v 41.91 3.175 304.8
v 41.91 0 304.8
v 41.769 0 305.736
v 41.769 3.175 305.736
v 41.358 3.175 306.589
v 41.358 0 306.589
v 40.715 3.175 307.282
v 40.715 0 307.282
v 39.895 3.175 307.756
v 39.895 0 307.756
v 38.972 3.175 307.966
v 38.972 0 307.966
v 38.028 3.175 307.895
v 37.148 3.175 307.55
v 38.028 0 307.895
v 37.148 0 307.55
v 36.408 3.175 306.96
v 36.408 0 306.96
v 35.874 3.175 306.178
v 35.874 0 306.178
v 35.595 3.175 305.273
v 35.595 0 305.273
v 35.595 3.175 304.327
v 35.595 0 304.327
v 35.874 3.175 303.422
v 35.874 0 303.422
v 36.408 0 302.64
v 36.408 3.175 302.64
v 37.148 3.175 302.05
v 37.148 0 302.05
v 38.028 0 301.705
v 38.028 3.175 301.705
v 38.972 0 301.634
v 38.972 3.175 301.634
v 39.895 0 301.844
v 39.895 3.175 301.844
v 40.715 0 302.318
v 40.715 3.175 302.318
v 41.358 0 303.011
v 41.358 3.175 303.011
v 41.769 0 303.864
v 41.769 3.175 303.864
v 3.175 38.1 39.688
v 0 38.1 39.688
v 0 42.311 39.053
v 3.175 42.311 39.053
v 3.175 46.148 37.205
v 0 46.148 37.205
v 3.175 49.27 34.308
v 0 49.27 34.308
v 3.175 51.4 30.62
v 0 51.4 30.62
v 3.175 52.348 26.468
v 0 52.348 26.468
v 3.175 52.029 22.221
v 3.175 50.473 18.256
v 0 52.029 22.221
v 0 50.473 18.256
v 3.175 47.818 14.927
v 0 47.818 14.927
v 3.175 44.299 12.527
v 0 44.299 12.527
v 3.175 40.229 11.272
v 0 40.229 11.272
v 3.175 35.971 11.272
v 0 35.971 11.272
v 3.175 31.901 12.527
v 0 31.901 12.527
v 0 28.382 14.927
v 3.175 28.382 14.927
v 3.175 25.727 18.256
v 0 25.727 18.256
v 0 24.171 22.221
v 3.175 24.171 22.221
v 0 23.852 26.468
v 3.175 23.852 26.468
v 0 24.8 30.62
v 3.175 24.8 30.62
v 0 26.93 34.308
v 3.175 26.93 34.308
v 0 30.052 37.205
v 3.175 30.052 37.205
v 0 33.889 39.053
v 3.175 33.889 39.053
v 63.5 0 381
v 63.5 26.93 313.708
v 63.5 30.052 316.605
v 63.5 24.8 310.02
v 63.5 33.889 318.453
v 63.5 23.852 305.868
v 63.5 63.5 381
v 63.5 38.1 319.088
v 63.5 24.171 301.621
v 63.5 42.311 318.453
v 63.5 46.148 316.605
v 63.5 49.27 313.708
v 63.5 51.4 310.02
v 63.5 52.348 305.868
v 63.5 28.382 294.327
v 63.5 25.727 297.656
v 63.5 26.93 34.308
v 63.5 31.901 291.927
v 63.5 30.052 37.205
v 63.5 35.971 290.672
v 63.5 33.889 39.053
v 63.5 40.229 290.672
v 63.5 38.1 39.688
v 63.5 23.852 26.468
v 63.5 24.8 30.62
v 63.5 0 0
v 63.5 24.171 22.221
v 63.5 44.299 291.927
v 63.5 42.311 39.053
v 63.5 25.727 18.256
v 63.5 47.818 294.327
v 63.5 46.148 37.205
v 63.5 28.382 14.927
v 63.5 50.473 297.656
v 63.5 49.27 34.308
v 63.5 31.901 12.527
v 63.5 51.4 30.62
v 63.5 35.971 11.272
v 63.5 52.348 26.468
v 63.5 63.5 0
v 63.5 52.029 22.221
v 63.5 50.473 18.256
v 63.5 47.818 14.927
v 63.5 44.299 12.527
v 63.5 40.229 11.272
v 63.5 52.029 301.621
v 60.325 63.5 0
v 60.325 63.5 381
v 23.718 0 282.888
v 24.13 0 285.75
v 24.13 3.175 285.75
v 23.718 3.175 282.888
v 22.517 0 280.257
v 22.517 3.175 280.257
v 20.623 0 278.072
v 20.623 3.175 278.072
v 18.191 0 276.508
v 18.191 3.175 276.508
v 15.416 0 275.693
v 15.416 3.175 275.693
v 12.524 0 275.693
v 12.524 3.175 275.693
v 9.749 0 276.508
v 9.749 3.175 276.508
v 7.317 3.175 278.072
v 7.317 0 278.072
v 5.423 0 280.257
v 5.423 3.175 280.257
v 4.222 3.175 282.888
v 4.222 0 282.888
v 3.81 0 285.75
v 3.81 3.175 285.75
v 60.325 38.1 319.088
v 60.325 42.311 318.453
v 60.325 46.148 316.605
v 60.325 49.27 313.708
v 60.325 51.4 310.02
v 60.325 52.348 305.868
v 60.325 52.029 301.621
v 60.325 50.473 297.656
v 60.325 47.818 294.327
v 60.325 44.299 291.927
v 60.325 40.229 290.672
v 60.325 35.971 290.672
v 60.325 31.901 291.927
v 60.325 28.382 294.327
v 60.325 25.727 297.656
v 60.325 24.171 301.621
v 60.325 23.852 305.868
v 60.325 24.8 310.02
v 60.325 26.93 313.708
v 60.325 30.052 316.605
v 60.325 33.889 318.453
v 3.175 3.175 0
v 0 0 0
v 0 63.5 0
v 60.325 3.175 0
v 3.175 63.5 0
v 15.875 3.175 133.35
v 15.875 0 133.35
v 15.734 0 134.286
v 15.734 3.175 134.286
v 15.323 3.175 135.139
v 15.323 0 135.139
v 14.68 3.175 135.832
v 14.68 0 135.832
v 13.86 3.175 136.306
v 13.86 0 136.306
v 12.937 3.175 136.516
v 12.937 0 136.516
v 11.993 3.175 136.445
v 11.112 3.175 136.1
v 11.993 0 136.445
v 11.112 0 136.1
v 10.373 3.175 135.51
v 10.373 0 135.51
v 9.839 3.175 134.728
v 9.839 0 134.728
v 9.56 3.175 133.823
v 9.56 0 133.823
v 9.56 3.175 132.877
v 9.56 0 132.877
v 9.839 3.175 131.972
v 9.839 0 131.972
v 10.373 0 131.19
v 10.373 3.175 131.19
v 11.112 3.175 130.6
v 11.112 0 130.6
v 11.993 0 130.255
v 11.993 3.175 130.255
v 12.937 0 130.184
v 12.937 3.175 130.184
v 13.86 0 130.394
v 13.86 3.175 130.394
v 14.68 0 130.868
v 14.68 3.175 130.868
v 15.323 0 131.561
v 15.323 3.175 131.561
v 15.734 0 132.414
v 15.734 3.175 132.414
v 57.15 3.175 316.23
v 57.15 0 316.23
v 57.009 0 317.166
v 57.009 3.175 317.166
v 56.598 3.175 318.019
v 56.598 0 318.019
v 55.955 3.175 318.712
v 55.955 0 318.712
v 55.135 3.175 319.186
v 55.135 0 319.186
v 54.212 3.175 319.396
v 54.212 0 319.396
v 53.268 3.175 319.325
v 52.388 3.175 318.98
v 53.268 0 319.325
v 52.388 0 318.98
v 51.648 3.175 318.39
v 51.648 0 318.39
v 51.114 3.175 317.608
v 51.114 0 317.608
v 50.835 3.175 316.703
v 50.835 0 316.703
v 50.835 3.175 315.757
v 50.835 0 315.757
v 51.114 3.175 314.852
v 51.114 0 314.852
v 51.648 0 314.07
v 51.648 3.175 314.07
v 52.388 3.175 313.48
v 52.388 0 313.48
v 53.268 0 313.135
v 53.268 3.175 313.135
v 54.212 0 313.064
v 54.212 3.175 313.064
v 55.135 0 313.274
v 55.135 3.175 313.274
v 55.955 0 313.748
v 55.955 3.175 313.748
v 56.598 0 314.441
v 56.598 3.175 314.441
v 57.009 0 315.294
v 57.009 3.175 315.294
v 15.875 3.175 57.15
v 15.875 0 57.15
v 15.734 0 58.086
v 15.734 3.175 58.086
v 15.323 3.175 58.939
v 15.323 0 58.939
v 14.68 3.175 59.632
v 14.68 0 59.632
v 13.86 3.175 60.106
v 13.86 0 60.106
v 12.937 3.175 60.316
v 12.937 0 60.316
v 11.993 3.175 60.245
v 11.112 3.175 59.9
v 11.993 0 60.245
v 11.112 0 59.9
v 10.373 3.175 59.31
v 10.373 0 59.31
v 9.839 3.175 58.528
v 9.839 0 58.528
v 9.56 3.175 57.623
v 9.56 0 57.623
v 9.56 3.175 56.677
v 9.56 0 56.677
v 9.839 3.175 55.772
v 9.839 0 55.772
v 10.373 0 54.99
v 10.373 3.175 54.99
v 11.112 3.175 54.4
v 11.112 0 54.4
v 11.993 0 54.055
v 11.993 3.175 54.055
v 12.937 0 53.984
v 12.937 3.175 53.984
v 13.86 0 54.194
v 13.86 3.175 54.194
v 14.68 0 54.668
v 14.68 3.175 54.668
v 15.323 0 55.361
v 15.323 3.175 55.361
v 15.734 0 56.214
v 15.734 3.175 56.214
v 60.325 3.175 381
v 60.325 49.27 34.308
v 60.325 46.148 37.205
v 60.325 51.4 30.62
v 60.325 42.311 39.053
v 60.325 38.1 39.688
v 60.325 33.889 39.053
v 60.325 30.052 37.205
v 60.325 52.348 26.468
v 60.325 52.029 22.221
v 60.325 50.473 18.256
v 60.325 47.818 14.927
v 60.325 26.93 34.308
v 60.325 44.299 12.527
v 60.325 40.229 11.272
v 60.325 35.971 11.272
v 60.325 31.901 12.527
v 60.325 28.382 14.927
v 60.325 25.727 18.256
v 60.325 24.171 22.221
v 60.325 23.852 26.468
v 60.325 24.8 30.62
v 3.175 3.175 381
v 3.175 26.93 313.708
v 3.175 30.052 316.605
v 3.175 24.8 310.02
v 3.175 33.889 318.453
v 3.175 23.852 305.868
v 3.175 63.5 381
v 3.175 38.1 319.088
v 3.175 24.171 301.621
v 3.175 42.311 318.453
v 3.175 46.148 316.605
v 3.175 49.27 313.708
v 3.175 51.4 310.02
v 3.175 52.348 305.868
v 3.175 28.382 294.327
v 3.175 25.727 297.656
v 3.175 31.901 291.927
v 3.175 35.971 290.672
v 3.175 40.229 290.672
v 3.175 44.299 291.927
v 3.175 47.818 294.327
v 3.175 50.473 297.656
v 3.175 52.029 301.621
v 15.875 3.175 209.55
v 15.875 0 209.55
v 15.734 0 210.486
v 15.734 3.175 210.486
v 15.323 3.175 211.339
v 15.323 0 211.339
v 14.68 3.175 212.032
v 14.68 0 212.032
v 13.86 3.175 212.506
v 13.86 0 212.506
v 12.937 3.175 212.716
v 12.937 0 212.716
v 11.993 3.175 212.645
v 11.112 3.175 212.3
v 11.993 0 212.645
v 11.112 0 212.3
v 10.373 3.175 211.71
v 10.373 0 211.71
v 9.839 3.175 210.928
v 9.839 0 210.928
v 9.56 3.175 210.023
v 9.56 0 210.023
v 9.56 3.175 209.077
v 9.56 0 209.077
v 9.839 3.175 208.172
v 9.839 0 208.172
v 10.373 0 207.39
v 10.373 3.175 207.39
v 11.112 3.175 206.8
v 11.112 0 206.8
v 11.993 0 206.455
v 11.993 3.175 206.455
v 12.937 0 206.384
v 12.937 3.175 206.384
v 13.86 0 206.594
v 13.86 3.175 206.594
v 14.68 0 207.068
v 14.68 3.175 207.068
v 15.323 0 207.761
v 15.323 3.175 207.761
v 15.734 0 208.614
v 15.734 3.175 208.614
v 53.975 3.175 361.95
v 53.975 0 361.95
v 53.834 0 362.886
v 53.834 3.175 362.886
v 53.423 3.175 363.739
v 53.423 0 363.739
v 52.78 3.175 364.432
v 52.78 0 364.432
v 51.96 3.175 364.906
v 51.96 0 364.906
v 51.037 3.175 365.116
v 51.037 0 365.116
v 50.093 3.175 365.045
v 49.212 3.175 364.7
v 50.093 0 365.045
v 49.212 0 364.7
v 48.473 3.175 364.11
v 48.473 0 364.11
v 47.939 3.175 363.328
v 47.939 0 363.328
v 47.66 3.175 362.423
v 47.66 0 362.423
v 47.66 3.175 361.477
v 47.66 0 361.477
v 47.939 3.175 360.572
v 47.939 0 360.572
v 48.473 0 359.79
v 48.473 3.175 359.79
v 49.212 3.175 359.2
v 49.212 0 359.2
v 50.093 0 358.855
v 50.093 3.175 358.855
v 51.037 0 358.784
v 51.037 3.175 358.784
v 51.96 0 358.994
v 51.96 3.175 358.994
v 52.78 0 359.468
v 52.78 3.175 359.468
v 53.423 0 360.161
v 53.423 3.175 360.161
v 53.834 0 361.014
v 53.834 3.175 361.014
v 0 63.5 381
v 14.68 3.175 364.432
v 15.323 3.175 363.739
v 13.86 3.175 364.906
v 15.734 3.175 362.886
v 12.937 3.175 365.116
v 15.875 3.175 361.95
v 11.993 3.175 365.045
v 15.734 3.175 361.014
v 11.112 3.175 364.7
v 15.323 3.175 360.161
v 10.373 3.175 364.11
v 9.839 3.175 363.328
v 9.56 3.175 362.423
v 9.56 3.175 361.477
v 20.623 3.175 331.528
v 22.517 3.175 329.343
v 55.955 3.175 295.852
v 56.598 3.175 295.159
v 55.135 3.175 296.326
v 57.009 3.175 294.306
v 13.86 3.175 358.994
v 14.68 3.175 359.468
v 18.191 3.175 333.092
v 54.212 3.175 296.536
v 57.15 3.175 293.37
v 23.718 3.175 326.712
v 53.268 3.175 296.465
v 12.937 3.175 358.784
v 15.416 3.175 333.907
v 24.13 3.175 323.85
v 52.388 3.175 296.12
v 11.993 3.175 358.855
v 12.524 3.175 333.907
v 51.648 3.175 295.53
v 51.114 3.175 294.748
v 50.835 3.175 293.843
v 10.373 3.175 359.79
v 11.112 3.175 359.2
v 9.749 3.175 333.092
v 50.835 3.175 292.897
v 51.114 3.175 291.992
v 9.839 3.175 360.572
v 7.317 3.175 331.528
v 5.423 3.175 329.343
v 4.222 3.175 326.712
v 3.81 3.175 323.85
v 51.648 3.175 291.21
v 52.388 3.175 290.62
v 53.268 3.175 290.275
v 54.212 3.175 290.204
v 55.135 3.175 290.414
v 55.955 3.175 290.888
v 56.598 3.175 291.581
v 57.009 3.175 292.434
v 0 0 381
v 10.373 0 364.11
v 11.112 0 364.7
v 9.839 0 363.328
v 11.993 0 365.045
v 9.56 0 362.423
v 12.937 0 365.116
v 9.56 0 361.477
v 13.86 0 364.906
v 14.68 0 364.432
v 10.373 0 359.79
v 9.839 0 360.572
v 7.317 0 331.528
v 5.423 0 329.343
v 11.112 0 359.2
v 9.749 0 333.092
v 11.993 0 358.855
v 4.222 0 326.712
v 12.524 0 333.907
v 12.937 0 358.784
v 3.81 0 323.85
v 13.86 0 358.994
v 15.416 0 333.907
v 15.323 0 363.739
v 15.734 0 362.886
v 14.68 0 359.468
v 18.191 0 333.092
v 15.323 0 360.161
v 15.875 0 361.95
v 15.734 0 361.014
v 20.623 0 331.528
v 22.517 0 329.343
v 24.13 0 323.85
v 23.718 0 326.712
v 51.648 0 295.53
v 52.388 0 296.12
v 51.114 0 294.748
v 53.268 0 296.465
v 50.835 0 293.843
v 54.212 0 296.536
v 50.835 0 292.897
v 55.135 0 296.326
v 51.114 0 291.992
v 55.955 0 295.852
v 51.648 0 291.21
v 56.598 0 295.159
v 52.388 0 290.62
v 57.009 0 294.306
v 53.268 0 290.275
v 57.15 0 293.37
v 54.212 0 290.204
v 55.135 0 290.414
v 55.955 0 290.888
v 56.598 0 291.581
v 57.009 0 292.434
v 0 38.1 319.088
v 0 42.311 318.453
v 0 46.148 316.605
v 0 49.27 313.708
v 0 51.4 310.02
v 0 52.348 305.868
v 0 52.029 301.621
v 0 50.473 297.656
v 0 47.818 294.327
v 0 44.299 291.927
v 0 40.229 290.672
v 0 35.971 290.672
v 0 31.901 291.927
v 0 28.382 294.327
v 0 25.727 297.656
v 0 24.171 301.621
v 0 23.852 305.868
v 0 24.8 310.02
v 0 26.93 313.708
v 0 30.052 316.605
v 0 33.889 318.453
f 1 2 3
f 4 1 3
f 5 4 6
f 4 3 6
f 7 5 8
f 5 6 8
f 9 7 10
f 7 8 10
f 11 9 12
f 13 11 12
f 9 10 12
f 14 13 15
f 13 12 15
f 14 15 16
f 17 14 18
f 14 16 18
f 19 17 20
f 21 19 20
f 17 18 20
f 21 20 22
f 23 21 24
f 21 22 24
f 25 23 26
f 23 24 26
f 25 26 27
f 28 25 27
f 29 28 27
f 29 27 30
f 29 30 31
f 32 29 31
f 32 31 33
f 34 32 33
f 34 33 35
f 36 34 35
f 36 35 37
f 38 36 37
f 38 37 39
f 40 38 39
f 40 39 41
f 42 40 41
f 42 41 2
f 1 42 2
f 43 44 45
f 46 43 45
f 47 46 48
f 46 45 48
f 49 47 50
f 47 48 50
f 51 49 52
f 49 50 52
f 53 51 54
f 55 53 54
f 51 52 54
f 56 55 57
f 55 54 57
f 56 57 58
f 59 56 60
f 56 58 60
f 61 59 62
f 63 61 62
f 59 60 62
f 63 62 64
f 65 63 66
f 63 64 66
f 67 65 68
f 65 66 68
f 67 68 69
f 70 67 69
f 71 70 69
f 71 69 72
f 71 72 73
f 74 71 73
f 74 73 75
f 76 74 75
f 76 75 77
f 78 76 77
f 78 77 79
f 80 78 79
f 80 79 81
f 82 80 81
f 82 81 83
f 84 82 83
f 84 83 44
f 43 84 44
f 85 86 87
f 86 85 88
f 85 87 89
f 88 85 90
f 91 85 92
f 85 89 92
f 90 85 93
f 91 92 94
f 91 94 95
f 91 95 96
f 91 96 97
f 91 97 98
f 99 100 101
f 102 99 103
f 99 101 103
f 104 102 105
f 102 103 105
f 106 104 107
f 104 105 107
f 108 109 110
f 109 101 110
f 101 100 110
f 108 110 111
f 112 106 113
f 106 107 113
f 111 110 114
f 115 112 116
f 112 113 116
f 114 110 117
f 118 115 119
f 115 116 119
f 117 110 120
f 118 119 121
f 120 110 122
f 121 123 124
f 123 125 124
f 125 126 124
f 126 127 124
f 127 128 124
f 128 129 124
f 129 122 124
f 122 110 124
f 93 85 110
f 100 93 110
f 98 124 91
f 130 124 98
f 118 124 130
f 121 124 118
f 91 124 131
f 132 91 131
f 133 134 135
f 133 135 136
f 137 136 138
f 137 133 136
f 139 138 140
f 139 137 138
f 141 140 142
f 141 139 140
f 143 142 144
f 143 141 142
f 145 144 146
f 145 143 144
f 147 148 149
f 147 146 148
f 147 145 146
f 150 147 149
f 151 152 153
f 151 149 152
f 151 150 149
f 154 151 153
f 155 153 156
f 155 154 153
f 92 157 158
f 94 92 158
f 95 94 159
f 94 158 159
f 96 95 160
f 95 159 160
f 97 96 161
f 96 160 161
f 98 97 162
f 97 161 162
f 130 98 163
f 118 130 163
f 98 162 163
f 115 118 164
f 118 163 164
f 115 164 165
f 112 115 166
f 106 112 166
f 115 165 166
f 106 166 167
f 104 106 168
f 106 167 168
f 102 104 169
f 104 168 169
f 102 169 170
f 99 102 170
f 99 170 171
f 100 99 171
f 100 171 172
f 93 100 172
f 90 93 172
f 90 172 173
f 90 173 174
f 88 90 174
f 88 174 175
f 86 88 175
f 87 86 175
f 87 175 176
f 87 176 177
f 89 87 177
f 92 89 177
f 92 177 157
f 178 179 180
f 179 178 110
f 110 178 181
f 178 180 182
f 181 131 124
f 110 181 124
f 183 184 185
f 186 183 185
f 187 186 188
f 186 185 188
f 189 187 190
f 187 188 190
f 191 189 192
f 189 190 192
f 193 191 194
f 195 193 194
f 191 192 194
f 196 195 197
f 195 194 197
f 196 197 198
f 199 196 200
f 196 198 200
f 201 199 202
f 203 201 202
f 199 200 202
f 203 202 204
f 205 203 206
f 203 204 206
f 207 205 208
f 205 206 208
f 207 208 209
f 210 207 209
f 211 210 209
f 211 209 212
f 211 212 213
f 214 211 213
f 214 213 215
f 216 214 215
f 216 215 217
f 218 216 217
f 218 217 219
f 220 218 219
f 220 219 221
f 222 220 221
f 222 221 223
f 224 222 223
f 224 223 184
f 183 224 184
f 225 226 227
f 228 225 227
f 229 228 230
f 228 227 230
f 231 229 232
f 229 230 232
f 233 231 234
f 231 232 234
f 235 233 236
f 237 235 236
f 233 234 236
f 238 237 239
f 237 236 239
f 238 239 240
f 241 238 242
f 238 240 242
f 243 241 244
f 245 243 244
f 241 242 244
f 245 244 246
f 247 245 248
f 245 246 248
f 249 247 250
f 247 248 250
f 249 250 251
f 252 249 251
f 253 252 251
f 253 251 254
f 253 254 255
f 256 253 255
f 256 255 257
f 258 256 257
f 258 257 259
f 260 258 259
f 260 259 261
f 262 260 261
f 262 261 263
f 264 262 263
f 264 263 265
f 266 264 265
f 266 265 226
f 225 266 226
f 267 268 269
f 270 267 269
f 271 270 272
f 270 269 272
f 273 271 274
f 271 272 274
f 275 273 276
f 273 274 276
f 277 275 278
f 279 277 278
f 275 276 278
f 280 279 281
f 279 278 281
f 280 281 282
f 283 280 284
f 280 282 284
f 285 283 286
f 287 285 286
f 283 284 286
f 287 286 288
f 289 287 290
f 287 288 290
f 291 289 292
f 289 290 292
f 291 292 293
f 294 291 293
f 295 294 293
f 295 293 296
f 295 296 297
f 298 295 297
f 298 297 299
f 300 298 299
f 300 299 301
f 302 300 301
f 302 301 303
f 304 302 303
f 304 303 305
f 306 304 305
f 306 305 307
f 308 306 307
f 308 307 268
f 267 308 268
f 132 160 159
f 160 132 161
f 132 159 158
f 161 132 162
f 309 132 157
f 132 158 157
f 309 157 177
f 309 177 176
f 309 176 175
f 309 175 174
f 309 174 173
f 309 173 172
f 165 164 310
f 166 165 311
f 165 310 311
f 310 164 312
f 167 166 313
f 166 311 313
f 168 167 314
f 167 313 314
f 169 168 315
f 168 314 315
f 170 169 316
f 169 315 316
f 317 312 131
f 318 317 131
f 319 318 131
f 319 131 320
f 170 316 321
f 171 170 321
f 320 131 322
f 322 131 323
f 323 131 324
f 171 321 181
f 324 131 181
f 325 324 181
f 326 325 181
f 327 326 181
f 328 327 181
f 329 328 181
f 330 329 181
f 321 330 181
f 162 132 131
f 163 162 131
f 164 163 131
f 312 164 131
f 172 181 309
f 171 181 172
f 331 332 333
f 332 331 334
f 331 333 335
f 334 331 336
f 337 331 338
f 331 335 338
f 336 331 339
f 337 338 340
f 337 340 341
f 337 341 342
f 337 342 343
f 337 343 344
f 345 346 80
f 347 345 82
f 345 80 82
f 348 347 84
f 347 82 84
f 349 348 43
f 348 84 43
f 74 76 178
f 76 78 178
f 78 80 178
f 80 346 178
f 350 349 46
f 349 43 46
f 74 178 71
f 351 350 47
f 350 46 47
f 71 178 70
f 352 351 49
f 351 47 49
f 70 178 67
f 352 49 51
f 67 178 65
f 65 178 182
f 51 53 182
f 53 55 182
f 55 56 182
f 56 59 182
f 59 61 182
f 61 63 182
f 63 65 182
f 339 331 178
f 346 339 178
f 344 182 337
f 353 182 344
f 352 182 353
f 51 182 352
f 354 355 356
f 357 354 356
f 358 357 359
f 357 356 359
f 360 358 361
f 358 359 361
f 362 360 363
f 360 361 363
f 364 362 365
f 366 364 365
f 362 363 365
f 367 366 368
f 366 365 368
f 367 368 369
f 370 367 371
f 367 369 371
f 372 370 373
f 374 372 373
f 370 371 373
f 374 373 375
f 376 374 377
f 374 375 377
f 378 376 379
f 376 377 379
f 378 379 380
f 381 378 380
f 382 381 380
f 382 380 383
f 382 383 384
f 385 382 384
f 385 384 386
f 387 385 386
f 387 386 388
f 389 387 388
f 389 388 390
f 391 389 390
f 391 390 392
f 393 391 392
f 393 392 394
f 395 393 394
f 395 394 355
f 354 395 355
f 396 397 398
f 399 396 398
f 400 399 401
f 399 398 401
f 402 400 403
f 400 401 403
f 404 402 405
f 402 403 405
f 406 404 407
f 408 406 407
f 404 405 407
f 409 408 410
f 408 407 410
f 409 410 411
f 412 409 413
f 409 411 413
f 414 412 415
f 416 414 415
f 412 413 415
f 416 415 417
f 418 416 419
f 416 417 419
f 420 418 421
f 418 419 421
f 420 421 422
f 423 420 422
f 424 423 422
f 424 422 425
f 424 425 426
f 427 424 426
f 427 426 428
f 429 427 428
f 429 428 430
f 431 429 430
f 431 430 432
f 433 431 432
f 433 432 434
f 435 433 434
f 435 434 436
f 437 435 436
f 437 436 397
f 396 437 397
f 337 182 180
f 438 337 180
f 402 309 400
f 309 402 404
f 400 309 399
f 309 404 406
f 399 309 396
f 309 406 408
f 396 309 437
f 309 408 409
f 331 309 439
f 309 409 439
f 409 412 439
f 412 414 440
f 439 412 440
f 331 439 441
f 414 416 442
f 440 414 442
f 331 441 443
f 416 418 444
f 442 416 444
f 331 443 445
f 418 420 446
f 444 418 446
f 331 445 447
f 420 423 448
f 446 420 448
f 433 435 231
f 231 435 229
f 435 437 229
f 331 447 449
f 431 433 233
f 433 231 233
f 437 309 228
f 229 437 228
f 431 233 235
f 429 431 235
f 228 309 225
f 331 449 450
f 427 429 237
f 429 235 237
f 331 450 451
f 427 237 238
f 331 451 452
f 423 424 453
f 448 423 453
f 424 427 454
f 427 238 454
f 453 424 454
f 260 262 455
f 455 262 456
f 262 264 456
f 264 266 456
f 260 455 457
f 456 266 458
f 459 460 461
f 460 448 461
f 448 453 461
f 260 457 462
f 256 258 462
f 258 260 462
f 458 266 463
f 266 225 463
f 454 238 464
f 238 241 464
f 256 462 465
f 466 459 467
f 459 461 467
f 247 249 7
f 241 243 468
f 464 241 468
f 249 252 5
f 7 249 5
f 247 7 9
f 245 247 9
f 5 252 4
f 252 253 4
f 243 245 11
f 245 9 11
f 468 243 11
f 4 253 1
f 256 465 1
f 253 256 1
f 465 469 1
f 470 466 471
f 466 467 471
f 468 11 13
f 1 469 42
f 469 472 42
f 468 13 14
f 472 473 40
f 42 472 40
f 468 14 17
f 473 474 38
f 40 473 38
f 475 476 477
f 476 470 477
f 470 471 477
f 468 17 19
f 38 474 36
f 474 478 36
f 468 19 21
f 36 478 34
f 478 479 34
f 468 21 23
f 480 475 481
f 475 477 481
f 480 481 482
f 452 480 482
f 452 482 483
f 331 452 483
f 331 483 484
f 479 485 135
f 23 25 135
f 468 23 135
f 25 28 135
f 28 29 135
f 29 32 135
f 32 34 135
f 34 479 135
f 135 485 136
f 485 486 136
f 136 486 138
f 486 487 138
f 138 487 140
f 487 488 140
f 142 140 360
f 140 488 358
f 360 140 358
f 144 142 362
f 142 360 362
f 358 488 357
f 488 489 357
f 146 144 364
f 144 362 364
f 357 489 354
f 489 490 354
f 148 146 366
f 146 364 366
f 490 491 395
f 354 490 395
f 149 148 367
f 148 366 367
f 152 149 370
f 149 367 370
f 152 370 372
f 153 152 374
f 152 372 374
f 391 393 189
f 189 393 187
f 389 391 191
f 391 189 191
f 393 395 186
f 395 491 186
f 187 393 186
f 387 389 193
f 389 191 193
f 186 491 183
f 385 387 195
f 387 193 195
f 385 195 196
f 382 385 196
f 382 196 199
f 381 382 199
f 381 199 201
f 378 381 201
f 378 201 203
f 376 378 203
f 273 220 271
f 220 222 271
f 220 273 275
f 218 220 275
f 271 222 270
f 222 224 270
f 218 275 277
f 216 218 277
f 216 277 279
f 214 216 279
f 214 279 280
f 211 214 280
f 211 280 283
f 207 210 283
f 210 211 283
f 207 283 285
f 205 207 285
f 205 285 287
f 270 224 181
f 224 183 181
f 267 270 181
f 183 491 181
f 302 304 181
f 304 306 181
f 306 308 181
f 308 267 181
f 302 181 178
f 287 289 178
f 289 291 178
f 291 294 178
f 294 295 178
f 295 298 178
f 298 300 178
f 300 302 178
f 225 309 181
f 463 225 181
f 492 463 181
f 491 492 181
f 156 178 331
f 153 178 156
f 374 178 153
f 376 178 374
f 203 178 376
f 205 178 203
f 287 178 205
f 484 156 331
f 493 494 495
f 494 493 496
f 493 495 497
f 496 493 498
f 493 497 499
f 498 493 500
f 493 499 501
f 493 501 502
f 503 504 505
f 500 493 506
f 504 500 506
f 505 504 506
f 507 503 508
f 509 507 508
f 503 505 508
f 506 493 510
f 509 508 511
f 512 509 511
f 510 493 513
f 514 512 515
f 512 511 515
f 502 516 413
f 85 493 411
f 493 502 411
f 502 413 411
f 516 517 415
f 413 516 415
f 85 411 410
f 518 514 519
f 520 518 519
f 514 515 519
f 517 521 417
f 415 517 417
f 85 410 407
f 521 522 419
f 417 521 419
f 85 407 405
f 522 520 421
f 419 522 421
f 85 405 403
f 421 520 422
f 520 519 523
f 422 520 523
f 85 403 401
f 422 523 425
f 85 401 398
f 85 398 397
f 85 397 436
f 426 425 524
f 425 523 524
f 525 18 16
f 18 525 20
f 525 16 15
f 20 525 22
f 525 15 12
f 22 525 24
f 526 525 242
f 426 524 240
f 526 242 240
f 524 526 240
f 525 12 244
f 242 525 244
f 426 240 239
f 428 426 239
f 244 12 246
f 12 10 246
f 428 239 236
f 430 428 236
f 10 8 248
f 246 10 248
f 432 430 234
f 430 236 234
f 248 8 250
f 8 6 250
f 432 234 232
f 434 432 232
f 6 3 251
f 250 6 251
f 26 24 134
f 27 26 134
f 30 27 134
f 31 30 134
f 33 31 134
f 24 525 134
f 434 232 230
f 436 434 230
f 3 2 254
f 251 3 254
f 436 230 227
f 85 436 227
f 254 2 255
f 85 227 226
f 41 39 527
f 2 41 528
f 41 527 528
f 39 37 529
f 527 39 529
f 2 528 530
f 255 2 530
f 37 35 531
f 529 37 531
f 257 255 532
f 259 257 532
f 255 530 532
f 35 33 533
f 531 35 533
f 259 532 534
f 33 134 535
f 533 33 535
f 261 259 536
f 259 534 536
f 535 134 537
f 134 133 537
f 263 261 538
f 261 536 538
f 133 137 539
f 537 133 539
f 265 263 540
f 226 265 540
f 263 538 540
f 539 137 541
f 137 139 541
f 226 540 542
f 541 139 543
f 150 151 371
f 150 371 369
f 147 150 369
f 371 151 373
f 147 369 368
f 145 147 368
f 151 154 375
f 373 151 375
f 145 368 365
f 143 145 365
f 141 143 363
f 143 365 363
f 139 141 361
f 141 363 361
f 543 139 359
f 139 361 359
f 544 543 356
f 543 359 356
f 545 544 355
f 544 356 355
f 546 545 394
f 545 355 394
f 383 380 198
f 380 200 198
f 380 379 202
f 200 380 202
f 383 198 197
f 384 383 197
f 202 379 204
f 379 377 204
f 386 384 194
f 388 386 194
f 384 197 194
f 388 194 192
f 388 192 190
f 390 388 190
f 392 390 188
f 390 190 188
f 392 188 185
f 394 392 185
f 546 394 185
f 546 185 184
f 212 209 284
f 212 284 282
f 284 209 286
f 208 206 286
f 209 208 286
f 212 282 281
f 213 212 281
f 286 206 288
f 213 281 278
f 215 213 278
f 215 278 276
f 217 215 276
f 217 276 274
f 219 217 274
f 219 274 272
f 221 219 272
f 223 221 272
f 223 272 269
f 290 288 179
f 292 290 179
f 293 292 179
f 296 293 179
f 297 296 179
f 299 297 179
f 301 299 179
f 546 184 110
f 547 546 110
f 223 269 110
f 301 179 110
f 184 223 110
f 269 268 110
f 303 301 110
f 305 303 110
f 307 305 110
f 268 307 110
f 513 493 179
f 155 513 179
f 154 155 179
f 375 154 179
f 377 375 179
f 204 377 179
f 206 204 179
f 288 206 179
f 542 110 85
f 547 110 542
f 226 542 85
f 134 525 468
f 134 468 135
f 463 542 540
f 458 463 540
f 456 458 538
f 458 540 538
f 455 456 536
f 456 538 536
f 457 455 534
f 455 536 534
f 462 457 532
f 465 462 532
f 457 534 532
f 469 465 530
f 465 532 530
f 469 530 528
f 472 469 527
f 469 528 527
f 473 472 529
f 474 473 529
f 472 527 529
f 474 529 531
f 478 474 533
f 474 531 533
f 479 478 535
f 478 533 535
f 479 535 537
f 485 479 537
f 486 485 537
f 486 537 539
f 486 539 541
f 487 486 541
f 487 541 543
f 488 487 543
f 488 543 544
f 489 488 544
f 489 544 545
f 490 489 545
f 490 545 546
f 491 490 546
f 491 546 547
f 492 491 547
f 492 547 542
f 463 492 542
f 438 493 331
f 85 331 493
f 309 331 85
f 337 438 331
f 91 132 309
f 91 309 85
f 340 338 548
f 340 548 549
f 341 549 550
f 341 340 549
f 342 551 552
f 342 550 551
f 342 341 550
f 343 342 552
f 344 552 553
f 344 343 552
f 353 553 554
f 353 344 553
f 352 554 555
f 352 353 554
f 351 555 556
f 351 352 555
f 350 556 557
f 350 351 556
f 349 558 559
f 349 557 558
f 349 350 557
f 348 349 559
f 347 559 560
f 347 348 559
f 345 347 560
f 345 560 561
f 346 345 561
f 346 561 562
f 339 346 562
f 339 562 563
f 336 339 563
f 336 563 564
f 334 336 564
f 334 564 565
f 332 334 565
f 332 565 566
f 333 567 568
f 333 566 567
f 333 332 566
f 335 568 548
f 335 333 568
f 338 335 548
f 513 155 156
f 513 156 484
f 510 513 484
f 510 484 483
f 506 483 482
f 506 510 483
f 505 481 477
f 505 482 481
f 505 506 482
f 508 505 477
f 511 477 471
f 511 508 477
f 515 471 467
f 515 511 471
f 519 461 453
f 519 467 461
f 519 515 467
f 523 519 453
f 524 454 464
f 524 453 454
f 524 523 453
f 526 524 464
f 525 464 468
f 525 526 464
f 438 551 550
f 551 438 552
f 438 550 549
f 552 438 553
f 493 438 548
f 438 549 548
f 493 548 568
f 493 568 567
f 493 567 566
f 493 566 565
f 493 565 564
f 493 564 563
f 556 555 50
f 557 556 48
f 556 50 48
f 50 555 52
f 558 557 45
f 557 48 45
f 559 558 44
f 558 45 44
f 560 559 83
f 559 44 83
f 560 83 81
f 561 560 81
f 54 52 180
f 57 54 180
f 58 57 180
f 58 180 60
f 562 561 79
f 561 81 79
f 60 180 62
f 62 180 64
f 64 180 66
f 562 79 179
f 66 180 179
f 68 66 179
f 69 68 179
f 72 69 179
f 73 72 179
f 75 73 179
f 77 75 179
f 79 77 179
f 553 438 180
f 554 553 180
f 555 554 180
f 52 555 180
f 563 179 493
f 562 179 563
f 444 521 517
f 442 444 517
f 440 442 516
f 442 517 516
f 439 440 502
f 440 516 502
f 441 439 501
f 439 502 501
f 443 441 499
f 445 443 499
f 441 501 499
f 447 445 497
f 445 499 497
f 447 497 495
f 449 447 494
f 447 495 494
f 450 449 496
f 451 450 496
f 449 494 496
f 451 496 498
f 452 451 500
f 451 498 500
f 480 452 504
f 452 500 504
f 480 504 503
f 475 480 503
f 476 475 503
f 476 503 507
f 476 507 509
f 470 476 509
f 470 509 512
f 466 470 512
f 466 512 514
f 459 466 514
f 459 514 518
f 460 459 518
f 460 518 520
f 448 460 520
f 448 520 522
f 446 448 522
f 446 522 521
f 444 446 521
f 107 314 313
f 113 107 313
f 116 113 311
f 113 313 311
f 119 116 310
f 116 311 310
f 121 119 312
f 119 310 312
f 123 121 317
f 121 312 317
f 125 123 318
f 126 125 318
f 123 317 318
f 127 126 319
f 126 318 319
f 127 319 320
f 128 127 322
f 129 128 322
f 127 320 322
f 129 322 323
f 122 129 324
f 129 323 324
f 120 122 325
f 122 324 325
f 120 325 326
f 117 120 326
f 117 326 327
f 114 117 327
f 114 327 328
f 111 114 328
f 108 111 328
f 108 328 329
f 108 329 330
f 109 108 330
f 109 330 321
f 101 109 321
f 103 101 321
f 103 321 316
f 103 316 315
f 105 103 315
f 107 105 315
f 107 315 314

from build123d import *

# Parameters (mm, degrees)
BOSS_EXTRUDE1_DEPTH     = 381
SKETCH2_R               = 3.175
CUT_EXTRUDE1_DEPTH      = 1
CUT_EXTRUDE1_DEPTH_BACK = 64.5
CUT_EXTRUDE3_DEPTH      = 12.7
SKETCH7_R               = 14.2875
CUT_EXTRUDE4_DEPTH      = 14.97
CUT_EXTRUDE4_DEPTH_BACK = 50.53
SKETCH8_R               = 3.175
CUT_EXTRUDE5_DEPTH      = 1
CUT_EXTRUDE5_DEPTH_BACK = 64.5
SKETCH9_R               = 14.2875
CUT_EXTRUDE6_DEPTH      = 152.4


with BuildPart() as part:
    # Sketch1 → Boss-Extrude1 (new body)
    with BuildSketch(Plane.XY):
        Polygon((0, 0), (63.5, 0), (63.5, 63.5), (60.325, 63.5), (60.325, 3.175), (3.175, 3.175), (3.175, 63.5), (0, 63.5), align=None)
    extrude(amount=BOSS_EXTRUDE1_DEPTH)

    # Sketch2 → Cut-Extrude1 (cut, two sides)
    with BuildSketch(Plane.XZ) as cut_extrude1_sk:
        with Locations((12.7, 361.95)):
            Circle(SKETCH2_R)
        with Locations((50.8, 361.95)):
            Circle(SKETCH2_R)
        with Locations((12.7, 57.15)):
            Circle(SKETCH2_R)
        with Locations((12.7, 133.35)):
            Circle(SKETCH2_R)
        with Locations((12.7, 209.55)):
            Circle(SKETCH2_R)
    extrude(amount=CUT_EXTRUDE1_DEPTH, mode=Mode.SUBTRACT)
    extrude(cut_extrude1_sk.sketch, amount=-CUT_EXTRUDE1_DEPTH_BACK, mode=Mode.SUBTRACT)

    # Sketch4 → Cut-Extrude3 (cut)
    with BuildSketch(Plane.XZ):
        with BuildLine():
            Line((24.13, 323.85), (24.13, 285.75))
            ThreePointArc((24.13, 285.75), (13.97, 275.59), (3.81, 285.75))
            Line((3.81, 285.75), (3.81, 323.85))
            ThreePointArc((3.81, 323.85), (13.97, 334.01), (24.13, 323.85))
        make_face()
    extrude(amount=-CUT_EXTRUDE3_DEPTH, mode=Mode.SUBTRACT)

    # Sketch7 → Cut-Extrude4 (cut, two sides)
    with BuildSketch(Plane.ZY.offset(-13.97)) as cut_extrude4_sk:
        with Locations((304.8, 38.1)):
            Circle(SKETCH7_R)
    extrude(amount=CUT_EXTRUDE4_DEPTH, mode=Mode.SUBTRACT)
    extrude(cut_extrude4_sk.sketch, amount=-CUT_EXTRUDE4_DEPTH_BACK, mode=Mode.SUBTRACT)

    # Sketch8 → Cut-Extrude5 (cut, two sides)
    with BuildSketch(Plane.XZ) as cut_extrude5_sk:
        with Locations((38.735, 304.8)):
            Circle(SKETCH8_R)
        with Locations((53.975, 316.23)):
            Circle(SKETCH8_R)
        with Locations((53.975, 293.37)):
            Circle(SKETCH8_R)
    extrude(amount=CUT_EXTRUDE5_DEPTH, mode=Mode.SUBTRACT)
    extrude(cut_extrude5_sk.sketch, amount=-CUT_EXTRUDE5_DEPTH_BACK, mode=Mode.SUBTRACT)

    # Sketch9 → Cut-Extrude6 (cut)
    with BuildSketch(Plane.ZY):
        with Locations((25.4, 38.1)):
            Circle(SKETCH9_R)
    extrude(amount=-CUT_EXTRUDE6_DEPTH, mode=Mode.SUBTRACT)


solid = part.part
